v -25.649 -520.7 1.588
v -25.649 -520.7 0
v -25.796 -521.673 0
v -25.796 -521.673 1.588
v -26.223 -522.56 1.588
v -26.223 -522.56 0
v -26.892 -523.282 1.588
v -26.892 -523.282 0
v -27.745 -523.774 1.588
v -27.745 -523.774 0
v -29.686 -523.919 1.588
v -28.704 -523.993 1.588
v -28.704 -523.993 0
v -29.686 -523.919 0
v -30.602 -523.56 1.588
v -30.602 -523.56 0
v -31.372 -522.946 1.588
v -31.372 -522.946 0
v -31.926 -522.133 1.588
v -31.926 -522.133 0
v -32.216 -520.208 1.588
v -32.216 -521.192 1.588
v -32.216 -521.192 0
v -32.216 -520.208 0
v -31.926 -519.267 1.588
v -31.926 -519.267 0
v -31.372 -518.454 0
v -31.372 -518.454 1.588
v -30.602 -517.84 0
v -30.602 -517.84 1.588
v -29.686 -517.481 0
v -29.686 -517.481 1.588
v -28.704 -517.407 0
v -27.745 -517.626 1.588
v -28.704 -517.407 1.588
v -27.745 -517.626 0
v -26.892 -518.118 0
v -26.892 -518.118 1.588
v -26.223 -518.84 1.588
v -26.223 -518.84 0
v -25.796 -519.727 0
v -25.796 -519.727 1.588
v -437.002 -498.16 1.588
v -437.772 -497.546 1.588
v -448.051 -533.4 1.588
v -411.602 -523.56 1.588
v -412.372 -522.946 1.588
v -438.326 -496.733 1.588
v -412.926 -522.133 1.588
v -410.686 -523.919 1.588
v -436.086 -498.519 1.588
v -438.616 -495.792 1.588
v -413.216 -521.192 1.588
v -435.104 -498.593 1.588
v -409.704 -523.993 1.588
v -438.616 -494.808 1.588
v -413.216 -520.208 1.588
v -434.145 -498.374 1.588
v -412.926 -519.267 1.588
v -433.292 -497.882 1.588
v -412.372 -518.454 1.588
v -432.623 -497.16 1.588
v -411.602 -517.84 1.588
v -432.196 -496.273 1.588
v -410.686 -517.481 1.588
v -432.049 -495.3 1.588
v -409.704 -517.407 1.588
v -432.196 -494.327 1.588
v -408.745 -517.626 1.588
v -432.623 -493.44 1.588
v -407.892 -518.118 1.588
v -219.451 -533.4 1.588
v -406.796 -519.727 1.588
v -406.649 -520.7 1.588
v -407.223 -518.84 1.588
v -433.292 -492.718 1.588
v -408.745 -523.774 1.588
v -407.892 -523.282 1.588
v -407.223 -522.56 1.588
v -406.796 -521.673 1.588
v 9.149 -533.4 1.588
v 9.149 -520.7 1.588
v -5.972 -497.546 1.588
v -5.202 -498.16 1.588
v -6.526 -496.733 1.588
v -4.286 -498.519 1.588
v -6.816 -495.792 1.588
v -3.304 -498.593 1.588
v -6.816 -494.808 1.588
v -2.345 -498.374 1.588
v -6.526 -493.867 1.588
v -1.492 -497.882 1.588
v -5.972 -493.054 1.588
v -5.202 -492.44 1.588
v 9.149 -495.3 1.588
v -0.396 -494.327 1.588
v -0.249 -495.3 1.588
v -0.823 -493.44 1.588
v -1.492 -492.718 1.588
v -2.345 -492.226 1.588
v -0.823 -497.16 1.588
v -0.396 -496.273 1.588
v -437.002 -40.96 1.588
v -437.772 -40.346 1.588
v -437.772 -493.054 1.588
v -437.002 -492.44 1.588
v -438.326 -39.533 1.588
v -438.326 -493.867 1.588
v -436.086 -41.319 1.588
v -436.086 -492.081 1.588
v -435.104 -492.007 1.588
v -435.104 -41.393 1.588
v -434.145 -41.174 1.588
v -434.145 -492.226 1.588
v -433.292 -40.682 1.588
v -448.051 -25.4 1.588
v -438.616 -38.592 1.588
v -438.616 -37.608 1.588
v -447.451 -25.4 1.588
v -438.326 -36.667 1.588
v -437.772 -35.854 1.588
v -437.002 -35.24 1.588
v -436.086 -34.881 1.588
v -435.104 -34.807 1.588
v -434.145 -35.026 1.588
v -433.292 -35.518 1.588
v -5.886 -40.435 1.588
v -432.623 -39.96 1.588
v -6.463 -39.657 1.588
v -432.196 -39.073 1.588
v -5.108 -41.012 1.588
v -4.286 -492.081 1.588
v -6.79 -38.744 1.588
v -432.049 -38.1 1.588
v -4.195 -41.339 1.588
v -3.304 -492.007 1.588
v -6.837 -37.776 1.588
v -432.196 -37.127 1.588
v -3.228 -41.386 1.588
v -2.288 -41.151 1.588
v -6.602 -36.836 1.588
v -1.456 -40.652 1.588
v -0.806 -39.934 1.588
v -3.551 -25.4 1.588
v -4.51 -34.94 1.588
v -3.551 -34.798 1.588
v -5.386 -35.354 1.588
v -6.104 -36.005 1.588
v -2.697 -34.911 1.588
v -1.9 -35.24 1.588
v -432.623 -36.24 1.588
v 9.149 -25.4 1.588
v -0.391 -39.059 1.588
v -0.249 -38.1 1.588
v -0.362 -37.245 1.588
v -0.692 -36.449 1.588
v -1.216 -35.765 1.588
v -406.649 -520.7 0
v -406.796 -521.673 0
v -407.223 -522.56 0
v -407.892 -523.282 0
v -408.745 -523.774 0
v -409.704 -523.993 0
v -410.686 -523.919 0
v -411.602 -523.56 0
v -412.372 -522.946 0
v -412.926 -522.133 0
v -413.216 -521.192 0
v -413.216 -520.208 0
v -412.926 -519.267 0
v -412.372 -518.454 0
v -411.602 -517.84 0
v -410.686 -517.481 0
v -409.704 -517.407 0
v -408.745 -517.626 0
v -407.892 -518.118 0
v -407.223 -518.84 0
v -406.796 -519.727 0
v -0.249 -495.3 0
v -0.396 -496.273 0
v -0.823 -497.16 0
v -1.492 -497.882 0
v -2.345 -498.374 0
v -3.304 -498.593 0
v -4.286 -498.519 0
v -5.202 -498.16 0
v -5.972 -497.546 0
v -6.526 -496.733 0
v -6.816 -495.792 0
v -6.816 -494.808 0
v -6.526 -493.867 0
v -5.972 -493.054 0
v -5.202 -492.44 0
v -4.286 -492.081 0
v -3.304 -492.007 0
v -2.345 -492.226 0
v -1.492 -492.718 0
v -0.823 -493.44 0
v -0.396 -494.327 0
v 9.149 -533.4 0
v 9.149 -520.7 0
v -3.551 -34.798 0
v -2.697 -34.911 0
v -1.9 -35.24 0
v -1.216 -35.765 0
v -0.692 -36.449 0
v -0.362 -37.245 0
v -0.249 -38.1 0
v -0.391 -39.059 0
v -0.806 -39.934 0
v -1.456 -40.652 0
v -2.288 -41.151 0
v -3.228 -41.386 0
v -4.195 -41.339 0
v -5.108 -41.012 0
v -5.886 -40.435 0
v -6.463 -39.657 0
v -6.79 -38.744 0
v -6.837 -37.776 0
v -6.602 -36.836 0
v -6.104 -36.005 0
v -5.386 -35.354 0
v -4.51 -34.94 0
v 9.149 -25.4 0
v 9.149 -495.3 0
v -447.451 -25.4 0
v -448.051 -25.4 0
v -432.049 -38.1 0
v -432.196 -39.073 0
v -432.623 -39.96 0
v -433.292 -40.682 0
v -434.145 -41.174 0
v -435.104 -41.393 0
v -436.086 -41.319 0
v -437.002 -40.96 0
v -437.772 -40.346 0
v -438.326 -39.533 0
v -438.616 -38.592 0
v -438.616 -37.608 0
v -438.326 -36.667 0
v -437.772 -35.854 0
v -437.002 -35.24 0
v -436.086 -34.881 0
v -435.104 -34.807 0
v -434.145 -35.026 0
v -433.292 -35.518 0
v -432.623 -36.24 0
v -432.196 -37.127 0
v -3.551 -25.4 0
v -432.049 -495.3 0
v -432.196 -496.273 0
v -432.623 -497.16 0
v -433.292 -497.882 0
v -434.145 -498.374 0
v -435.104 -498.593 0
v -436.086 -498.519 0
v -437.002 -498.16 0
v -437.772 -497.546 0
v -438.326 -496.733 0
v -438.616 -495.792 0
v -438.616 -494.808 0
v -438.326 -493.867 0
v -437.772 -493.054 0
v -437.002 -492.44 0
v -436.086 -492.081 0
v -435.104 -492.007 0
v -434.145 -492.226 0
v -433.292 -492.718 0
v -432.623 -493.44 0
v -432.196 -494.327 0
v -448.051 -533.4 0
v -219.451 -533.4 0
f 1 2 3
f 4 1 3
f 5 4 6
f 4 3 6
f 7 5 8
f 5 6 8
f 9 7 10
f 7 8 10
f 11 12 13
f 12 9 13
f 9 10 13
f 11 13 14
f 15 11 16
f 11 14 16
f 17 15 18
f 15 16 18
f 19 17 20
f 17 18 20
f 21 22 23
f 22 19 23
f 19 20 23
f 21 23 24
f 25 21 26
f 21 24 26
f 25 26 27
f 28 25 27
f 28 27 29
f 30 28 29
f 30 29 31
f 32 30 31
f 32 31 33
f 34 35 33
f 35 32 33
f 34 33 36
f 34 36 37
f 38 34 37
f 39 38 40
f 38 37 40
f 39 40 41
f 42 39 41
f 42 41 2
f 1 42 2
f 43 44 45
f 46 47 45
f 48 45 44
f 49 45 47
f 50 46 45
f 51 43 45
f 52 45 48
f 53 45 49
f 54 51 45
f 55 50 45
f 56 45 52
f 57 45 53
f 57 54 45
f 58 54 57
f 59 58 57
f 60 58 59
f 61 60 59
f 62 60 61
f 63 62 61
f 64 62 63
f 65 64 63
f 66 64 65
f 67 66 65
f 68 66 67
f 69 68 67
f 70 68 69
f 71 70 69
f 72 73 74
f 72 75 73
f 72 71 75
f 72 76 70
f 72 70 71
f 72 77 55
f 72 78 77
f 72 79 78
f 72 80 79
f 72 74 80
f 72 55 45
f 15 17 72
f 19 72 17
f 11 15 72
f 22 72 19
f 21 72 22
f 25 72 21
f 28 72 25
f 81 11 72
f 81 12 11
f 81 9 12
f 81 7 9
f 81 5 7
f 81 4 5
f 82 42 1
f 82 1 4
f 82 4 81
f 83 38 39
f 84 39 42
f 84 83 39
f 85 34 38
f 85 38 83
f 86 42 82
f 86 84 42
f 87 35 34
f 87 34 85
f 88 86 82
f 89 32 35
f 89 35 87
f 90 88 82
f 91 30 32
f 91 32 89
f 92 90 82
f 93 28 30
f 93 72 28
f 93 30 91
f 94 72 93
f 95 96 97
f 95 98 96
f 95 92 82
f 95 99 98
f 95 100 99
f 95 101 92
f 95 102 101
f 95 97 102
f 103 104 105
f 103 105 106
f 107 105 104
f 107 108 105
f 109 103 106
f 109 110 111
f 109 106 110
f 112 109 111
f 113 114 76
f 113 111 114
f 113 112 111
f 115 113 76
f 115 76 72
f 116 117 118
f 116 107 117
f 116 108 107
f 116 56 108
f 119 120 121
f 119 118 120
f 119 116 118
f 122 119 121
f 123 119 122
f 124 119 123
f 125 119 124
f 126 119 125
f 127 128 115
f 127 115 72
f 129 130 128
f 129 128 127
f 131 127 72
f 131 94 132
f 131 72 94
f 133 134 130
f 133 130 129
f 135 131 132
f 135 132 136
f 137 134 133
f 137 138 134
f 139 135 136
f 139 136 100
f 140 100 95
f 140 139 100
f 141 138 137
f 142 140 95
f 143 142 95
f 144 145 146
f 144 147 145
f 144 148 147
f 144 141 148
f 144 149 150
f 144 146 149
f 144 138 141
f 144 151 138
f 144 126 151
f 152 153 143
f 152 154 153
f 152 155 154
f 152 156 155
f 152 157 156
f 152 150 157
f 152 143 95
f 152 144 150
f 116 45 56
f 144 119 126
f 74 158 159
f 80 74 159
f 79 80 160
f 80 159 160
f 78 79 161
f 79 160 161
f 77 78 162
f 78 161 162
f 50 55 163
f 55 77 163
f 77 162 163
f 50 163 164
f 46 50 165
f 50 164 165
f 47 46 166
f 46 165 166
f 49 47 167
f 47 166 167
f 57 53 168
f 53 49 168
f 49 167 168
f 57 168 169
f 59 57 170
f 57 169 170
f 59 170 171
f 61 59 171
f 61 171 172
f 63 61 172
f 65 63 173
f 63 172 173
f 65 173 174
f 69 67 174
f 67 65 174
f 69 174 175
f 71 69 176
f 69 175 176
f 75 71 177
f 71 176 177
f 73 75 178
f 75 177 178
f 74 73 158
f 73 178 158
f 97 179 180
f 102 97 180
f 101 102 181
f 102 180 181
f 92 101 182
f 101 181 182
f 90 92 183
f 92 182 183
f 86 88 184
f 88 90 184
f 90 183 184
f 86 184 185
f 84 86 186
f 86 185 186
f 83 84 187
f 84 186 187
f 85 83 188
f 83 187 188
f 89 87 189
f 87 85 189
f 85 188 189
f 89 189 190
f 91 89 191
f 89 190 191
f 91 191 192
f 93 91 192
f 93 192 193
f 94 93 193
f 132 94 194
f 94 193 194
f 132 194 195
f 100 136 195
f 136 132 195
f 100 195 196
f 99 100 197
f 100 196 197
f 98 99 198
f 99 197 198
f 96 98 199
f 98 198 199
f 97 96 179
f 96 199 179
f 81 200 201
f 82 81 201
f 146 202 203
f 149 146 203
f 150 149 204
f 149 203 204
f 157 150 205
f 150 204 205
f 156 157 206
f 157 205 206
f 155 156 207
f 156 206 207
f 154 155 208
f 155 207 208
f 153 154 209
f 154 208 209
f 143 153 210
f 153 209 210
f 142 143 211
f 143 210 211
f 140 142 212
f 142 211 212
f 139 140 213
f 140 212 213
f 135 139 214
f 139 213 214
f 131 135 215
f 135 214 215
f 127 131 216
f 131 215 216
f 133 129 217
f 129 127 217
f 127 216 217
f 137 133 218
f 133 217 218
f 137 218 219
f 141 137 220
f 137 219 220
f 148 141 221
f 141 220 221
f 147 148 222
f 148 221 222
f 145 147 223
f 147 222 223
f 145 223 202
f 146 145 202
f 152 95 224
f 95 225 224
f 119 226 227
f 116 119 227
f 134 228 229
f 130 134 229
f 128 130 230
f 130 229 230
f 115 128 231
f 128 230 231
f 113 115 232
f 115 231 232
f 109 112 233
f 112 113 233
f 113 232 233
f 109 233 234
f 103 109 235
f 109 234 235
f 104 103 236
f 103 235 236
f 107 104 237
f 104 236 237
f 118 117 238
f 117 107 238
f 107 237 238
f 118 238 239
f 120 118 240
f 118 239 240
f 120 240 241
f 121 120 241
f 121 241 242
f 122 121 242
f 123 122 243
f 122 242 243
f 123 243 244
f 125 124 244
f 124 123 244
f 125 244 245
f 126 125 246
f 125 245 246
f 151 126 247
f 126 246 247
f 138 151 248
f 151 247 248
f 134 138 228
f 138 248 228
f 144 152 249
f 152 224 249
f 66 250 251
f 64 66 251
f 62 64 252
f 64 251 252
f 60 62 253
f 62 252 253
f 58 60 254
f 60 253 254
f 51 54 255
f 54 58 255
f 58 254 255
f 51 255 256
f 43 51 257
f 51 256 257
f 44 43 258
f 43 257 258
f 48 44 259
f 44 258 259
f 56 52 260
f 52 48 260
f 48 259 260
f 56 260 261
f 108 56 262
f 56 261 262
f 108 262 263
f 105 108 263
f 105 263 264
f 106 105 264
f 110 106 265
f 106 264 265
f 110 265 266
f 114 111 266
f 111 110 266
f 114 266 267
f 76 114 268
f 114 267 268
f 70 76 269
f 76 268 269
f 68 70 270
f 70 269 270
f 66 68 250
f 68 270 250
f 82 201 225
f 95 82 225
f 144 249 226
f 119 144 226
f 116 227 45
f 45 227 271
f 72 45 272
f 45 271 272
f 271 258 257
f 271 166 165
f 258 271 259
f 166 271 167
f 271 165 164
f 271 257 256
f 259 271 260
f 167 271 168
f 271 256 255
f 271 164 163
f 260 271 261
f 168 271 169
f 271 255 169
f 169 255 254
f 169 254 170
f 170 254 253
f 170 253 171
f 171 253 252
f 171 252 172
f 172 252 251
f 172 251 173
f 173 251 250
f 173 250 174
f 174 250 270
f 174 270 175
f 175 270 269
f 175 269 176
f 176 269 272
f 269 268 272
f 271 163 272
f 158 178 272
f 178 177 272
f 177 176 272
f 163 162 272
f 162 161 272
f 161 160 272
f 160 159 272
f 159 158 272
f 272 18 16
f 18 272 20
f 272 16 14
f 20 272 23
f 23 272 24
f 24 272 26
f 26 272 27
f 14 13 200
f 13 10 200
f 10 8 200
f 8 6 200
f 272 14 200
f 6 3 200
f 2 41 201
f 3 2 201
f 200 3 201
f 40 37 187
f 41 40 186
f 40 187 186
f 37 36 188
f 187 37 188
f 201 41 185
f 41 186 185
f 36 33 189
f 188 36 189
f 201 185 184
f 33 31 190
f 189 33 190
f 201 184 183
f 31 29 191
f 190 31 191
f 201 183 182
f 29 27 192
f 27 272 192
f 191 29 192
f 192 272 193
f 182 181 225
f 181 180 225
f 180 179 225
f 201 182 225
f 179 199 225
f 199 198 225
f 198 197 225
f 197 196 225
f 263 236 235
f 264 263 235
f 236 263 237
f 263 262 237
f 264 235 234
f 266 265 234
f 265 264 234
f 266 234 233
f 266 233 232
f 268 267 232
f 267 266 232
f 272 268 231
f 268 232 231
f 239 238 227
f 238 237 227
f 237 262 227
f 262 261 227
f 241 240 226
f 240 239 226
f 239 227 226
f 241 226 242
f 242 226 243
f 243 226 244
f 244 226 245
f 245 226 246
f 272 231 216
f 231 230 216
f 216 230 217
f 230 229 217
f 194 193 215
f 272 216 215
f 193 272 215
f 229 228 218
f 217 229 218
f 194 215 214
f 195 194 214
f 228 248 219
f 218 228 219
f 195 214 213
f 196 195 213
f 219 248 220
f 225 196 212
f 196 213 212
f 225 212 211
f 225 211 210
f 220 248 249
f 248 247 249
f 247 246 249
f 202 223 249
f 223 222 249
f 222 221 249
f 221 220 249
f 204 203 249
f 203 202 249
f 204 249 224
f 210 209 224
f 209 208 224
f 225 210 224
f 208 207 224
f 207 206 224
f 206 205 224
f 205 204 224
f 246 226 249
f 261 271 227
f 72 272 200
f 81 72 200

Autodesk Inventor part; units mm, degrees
ref_plane "YZ Plane" through (0, 0, 0) normal (1, 0, 0) x (0, 1, 0)
ref_plane "XZ Plane" through (0, 0, 0) normal (0, 1, 0) x (-1, 0, 0)
ref_plane "XY Plane" through (0, 0, 0) normal (0, 0, 1) x (1, 0, 0)
ref_plane "Work Plane1" through (-6.5024, 0, 0) normal (0, 0, 1) x (1, 0, 0)
sketch "Sketch1" plane through (-6.5024, 0, 0) normal (0, 0, 1) x (1, 0, 0)
  line L0 (15.6512, -12.7) -> (15.6512, -25.4) projected
  line L1 (-440.9488, -12.7) -> (-440.9488, -25.4) projected
  line L2 (15.6512, -25.4) -> (-441.5488, -25.4)
  line L3 (-441.5488, -25.4) -> (-441.5488, -533.4)
  line L4 (-441.5488, -533.4) -> (15.6512, -533.4)
  line L5 (15.6512, -533.4) -> (15.6512, -25.4)
  line L6 (15.6512, -25.4) -> (2.9512, -25.4)
  line L7 (2.9512, -25.4) -> (2.9512, -38.1)
  circle A0 centre (2.9512, -38.1) radius 3.302
  line L8 (15.6512, -533.4) -> (15.6512, -495.3)
  line L9 (15.6512, -495.3) -> (2.9512, -495.3)
  circle A1 centre (2.9512, -495.3) radius 3.302
  line L10 (15.6512, -533.4) -> (15.6512, -520.7)
  line L11 (15.6512, -520.7) -> (-22.4488, -520.7)
  circle A2 centre (-22.4488, -520.7) radius 3.302
  line L12 (15.6512, -533.4) -> (-212.9488, -533.4)
  line L13 (-212.9488, -533.4) -> (-212.9488, -454.8045)
  circle A3 centre (-428.8488, -38.1) radius 3.302
  circle A4 centre (-428.8488, -495.3) radius 3.302
  circle A5 centre (-403.4488, -520.7) radius 3.302
  point P0 (6.5024, 0)
  dimension "d0" = 457.2
  dimension "d1" = 508
  dimension "d2" = 12.7
  dimension "d3" = 12.7
  dimension "d4" = 6.604
  dimension "d5" = 38.1
  dimension "d6" = 12.7
  dimension "d7" = 6.604
  dimension "d8" = 12.7
  dimension "d9" = 38.1
  dimension "d10" = 6.604
  dimension "d11" = 228.6
extrude "Extrusion1" add sketch "Sketch1" along normal blind 1.5875
properties part number "vrRig_v08_enclosure_backPanel"
